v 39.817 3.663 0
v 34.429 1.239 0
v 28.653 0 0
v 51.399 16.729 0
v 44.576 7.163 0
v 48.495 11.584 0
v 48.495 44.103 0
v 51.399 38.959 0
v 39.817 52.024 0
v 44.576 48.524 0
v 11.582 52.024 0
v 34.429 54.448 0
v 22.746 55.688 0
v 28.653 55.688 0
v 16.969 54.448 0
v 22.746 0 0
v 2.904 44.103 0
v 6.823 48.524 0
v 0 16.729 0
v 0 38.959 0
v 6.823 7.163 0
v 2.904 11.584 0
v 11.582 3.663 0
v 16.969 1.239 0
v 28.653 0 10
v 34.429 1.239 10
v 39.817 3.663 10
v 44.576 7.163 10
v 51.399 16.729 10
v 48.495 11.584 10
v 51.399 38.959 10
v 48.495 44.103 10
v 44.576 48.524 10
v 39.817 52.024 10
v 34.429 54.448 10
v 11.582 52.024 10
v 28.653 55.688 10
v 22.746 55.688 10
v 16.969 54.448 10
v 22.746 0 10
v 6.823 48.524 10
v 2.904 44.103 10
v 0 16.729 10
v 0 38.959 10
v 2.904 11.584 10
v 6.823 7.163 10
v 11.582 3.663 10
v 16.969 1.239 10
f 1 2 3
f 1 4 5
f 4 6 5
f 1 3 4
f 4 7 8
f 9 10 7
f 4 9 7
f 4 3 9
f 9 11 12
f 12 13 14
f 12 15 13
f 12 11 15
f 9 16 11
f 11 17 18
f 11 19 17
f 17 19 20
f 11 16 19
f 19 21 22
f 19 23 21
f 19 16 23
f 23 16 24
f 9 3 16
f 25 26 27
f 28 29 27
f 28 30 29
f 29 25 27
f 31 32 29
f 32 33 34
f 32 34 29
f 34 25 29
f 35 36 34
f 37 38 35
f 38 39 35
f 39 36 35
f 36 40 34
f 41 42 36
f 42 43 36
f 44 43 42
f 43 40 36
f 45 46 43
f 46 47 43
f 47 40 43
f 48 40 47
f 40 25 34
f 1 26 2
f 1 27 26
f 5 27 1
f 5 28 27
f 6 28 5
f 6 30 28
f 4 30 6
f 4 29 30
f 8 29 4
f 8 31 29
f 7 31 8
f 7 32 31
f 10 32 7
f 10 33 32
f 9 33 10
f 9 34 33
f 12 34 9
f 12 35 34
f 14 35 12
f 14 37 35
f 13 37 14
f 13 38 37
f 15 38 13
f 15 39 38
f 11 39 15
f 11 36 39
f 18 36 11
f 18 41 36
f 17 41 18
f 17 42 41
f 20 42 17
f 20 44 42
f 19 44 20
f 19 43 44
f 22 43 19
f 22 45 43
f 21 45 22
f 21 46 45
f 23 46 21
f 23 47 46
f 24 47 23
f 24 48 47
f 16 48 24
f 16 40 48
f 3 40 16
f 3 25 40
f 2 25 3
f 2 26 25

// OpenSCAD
$fn = 32;

// ----------------------------------------------------------------------
// Flat adaptor: double_d, 10 mm thick
// ----------------------------------------------------------------------

// --- parameters (mm) ---
profile_height = 10;      // extrusion height
profile_points = 24;      // points of the closed outline

profile = [[51.399, 38.959], [48.495, 44.103], [44.576, 48.524], [39.817, 52.024], [34.429, 54.448], [28.653, 55.688], [22.746, 55.688], [16.969, 54.448], [11.582, 52.024], [6.823, 48.524], [2.904, 44.103], [0, 38.959], [0, 16.729], [2.904, 11.584], [6.823, 7.163], [11.582, 3.663], [16.969, 1.239], [22.746, 0], [28.653, 0], [34.429, 1.239], [39.817, 3.663], [44.576, 7.163], [48.495, 11.584], [51.399, 16.729]];  // single closed polygon, 24 points, counter clockwise

// --- the one profile operation ---
linear_extrude(height = profile_height) polygon(points = profile);
